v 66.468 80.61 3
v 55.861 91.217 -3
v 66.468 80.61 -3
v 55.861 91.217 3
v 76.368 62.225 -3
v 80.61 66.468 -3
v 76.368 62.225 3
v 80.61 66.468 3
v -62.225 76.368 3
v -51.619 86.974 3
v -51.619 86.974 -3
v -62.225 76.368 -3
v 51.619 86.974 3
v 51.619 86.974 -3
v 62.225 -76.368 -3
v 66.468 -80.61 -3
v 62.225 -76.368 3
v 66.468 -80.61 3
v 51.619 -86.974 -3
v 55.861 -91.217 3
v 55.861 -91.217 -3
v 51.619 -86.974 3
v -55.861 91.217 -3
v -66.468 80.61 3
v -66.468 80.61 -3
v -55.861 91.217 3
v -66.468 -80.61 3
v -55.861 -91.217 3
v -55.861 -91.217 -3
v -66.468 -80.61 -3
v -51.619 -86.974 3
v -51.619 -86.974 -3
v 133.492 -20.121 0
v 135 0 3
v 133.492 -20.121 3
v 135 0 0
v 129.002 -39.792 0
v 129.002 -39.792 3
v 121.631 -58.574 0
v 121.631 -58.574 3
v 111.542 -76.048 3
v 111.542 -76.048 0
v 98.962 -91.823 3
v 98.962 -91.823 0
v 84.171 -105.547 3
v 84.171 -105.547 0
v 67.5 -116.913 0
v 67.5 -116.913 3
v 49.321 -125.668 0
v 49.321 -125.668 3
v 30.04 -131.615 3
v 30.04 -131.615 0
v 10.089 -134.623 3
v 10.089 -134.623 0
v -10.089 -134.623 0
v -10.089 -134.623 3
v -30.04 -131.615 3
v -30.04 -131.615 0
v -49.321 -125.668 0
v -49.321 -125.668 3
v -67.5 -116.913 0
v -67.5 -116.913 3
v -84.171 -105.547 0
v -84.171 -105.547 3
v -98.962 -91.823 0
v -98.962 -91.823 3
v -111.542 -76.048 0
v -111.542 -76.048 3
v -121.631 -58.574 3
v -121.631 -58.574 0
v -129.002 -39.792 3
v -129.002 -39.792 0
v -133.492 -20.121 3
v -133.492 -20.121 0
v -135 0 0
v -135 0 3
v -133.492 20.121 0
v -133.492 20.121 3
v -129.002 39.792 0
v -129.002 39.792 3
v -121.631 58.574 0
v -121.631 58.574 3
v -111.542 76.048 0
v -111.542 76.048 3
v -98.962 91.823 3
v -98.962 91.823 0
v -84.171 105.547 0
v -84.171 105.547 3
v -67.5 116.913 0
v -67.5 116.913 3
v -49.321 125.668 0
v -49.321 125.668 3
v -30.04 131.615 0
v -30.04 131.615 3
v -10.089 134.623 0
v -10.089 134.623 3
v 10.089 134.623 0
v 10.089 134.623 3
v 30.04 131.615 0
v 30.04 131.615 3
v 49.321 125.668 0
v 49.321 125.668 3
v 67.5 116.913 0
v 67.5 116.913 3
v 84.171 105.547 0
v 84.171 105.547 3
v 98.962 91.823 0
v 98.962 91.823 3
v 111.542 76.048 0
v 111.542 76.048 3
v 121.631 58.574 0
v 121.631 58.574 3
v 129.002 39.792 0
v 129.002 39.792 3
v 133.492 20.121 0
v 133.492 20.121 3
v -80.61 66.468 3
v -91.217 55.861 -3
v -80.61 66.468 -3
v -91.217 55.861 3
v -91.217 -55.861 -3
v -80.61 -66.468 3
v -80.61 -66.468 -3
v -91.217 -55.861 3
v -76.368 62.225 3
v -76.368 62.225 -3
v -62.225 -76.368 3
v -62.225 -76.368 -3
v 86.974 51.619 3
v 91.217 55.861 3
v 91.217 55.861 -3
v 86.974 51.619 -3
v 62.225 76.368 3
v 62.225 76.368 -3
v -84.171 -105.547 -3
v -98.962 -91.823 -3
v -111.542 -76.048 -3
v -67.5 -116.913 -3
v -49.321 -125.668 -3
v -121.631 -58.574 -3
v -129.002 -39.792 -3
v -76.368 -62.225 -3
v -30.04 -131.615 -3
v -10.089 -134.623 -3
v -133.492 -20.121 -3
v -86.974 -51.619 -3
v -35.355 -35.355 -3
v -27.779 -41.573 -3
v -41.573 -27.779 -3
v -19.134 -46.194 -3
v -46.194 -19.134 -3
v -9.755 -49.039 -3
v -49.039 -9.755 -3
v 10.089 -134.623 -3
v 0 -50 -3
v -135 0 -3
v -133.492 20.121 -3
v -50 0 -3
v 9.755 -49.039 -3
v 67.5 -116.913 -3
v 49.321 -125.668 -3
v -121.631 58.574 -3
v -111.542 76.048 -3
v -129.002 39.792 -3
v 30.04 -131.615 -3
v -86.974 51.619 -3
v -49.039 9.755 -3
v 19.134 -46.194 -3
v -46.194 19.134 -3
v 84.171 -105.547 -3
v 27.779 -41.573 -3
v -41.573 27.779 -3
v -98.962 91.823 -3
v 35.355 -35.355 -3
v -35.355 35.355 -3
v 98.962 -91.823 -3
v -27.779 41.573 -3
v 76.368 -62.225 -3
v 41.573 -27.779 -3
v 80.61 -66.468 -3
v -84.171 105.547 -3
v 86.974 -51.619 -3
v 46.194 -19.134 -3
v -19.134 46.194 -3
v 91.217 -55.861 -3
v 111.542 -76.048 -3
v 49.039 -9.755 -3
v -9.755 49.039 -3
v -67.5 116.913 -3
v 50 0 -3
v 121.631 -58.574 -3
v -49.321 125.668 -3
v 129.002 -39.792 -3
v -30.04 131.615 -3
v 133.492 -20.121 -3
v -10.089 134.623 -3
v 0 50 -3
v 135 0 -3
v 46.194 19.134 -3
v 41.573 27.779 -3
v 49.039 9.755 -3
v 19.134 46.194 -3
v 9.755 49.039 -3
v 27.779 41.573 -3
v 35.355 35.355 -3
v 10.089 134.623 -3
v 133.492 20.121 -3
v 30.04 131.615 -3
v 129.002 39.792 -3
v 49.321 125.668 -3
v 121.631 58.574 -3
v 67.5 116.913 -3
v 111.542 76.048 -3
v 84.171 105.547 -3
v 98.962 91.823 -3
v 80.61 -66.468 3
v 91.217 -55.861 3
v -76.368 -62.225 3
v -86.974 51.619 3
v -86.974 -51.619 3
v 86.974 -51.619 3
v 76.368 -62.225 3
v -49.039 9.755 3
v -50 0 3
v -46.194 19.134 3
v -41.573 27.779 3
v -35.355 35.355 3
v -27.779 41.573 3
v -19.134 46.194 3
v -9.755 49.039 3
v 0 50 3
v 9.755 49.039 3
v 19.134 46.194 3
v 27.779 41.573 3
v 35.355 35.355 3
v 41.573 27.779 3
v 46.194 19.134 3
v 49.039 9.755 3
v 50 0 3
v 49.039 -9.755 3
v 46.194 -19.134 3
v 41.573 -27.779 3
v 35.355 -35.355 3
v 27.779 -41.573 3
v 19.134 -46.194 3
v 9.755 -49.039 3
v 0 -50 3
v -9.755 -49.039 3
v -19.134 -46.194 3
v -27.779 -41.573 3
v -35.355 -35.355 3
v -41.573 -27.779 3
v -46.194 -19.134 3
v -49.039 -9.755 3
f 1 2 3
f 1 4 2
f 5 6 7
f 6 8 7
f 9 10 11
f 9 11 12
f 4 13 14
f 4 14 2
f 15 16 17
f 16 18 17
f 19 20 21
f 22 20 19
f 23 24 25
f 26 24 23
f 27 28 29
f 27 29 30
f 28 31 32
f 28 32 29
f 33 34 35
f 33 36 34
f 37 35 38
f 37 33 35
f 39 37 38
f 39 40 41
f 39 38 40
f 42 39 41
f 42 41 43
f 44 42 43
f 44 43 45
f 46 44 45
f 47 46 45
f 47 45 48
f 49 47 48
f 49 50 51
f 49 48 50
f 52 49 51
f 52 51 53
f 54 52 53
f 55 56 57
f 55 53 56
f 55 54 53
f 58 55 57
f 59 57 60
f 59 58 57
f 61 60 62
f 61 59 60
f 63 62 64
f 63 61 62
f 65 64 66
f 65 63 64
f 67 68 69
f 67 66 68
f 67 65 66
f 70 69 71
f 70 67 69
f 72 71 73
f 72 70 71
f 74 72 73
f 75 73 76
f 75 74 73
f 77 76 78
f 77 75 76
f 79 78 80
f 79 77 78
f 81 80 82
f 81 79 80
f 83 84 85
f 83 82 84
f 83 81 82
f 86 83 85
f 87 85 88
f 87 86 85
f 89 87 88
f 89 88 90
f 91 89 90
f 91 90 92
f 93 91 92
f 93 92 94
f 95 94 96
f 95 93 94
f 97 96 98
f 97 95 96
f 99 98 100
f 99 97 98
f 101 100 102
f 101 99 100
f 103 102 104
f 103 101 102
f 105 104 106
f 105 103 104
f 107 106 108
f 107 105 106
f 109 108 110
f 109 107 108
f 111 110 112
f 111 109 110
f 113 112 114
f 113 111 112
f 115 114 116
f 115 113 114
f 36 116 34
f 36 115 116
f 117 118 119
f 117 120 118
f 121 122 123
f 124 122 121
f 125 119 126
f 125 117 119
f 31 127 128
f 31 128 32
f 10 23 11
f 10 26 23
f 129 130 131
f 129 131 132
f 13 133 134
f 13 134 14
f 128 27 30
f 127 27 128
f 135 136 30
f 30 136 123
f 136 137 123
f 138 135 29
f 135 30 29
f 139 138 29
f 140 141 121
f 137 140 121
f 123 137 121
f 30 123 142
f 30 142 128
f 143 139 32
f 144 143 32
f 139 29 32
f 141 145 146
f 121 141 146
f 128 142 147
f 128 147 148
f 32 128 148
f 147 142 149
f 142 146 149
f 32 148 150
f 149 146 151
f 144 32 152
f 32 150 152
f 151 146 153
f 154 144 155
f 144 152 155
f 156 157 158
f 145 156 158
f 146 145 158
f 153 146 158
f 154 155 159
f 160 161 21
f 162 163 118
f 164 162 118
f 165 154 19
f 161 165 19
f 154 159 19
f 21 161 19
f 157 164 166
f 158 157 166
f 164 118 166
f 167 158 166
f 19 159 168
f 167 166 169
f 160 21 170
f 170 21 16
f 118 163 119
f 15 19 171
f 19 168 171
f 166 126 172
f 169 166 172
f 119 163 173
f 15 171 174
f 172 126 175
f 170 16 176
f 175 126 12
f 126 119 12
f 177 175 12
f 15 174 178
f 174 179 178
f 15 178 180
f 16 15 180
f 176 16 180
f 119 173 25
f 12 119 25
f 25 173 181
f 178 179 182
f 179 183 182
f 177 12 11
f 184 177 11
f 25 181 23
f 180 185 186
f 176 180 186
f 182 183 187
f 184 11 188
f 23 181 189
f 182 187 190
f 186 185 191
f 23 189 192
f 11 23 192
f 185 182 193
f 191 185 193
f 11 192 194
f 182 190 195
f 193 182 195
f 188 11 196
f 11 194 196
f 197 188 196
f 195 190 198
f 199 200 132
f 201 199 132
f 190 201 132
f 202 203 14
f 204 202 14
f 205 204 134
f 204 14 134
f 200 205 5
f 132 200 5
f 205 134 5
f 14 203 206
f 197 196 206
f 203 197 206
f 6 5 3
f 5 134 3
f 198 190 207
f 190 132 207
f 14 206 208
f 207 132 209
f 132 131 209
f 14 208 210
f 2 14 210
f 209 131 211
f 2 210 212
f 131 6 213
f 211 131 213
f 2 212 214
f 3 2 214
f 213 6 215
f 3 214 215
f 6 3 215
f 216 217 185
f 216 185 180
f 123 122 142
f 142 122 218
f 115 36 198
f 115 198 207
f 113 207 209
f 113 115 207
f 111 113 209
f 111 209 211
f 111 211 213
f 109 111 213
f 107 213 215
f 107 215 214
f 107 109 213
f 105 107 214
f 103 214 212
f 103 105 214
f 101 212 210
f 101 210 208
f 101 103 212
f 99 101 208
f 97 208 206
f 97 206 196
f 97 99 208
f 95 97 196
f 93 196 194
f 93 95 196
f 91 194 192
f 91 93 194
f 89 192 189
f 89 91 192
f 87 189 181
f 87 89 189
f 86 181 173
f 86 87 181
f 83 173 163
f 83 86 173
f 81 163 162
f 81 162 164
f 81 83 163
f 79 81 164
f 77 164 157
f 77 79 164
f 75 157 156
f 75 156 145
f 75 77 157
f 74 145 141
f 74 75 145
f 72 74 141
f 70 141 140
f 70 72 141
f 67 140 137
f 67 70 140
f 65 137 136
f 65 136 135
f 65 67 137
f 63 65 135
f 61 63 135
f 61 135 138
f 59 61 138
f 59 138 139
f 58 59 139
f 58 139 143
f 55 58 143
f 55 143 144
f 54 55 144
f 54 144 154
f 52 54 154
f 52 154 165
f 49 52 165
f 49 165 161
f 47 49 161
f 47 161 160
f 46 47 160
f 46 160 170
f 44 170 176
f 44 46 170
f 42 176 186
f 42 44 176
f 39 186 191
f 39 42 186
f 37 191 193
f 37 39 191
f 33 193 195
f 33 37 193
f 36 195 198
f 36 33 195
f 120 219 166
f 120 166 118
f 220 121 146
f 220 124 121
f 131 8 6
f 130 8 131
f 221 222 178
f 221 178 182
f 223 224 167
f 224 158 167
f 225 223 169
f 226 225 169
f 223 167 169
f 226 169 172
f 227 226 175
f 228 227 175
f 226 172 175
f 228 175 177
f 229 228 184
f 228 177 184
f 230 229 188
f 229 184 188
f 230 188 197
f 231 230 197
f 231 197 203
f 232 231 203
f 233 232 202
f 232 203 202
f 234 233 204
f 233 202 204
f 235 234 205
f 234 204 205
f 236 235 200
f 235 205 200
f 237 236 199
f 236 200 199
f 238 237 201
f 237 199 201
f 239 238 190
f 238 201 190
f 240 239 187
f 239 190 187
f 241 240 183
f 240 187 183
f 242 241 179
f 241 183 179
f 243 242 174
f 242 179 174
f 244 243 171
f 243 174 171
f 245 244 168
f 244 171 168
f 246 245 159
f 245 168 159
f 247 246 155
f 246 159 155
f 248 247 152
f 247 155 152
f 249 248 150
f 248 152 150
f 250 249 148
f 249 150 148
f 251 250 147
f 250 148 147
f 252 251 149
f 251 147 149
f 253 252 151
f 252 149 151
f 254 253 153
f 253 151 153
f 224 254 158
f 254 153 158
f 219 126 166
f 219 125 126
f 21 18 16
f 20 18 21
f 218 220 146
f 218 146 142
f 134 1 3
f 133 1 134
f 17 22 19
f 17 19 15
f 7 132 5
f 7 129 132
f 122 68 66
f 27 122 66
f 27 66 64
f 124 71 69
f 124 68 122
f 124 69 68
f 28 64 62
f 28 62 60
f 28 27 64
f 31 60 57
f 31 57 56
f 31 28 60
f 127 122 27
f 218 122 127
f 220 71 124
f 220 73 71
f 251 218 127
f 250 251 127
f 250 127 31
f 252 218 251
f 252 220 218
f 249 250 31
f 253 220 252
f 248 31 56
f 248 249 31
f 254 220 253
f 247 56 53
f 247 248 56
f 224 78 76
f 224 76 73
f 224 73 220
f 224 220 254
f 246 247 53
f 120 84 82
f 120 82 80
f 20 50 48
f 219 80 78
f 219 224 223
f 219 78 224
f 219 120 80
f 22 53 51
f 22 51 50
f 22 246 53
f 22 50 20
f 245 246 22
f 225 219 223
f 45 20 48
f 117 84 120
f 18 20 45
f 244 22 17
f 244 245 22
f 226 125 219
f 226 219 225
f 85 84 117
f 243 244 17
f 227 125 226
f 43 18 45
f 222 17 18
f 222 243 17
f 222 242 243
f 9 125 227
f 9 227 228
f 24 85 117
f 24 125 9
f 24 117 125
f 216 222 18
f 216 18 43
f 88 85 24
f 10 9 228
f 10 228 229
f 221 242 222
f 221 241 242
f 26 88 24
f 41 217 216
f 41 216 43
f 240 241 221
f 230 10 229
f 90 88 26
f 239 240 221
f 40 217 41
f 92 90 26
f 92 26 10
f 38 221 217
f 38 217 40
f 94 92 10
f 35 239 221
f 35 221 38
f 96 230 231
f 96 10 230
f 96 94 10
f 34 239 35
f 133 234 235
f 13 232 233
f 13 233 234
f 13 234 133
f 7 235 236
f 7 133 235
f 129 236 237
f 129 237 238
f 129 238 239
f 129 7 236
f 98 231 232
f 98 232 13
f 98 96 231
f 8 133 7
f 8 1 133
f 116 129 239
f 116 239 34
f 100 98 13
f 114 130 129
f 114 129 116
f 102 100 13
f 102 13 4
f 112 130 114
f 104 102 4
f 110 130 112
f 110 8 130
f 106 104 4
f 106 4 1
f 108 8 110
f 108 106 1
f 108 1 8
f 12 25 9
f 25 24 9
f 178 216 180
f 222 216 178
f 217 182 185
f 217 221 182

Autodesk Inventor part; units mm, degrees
ref_plane "YZ Plane" through (0, 0, 0) normal (1, 0, 0) x (0, 1, 0)
ref_plane "XZ Plane" through (0, 0, 0) normal (0, 1, 0) x (-1, 0, 0)
ref_plane "XY Plane" through (0, 0, 0) normal (0, 0, 1) x (1, 0, 0)
sketch "Эскиз1" plane through (0, 0, 0) normal (0, 0, 1) x (1, 0, 0)
  circle A0 centre (0, 0) radius 135
  dimension "d0" = 270
extrude "Выдавливание1" add sketch "Эскиз1" along normal mid plane 6
sketch "Эскиз3" plane through (0, 0, -3) normal (0, 0, -1) x (-1, 0, 0)
  circle A0 centre (0, 0) radius 50
  dimension "d14" = 100
extrude "Выдавливание2" cut sketch "Эскиз3" against normal through all
sketch "Эскиз4" plane through (0, 0, 3) normal (0, 0, 1) x (1, 0, 0)
  circle A0 centre (0, 0) radius 101 construction
  circle A1 centre (0, 101) radius 26.5 construction
  line L0 (0, 0) -> (118.5479, 118.5479) construction
  line L1 (0, 0) -> (0, 152.163) construction
  line L2 (86.9741, 51.6188) -> (51.6188, 86.9741)
  line L3 (51.6188, 86.9741) -> (55.8614, 91.2168)
  line L4 (55.8614, 91.2168) -> (91.2168, 55.8614)
  line L5 (91.2168, 55.8614) -> (86.9741, 51.6188)
  line L6 (86.9741, 51.6188) -> (55.8614, 91.2168) construction
  line L7 (51.6188, 86.9741) -> (91.2168, 55.8614) construction
  line L8 (66.468, 80.6102) -> (62.2254, 76.3675)
  line L9 (80.6102, 66.468) -> (76.3675, 62.2254)
  point P0 (71.4178, 71.4178)
  dimension "d17" = 202
  dimension "d18" = 53
  dimension "d19" = 45
  dimension "d20" = 6
  dimension "d21" = 50
  dimension "d22" = 15
extrude "Выдавливание3" cut sketch "Эскиз4" against normal through all contours L2 L9 L4 L5 | L2 L3 L4 L8
pattern_circular "Круговой массив2" count 4 over 360 about axis through (0, 0, 0) along (0, 0, 1) of "Выдавливание3"
properties part number "Диск_опорный_В5" material "По умолчанию1"
